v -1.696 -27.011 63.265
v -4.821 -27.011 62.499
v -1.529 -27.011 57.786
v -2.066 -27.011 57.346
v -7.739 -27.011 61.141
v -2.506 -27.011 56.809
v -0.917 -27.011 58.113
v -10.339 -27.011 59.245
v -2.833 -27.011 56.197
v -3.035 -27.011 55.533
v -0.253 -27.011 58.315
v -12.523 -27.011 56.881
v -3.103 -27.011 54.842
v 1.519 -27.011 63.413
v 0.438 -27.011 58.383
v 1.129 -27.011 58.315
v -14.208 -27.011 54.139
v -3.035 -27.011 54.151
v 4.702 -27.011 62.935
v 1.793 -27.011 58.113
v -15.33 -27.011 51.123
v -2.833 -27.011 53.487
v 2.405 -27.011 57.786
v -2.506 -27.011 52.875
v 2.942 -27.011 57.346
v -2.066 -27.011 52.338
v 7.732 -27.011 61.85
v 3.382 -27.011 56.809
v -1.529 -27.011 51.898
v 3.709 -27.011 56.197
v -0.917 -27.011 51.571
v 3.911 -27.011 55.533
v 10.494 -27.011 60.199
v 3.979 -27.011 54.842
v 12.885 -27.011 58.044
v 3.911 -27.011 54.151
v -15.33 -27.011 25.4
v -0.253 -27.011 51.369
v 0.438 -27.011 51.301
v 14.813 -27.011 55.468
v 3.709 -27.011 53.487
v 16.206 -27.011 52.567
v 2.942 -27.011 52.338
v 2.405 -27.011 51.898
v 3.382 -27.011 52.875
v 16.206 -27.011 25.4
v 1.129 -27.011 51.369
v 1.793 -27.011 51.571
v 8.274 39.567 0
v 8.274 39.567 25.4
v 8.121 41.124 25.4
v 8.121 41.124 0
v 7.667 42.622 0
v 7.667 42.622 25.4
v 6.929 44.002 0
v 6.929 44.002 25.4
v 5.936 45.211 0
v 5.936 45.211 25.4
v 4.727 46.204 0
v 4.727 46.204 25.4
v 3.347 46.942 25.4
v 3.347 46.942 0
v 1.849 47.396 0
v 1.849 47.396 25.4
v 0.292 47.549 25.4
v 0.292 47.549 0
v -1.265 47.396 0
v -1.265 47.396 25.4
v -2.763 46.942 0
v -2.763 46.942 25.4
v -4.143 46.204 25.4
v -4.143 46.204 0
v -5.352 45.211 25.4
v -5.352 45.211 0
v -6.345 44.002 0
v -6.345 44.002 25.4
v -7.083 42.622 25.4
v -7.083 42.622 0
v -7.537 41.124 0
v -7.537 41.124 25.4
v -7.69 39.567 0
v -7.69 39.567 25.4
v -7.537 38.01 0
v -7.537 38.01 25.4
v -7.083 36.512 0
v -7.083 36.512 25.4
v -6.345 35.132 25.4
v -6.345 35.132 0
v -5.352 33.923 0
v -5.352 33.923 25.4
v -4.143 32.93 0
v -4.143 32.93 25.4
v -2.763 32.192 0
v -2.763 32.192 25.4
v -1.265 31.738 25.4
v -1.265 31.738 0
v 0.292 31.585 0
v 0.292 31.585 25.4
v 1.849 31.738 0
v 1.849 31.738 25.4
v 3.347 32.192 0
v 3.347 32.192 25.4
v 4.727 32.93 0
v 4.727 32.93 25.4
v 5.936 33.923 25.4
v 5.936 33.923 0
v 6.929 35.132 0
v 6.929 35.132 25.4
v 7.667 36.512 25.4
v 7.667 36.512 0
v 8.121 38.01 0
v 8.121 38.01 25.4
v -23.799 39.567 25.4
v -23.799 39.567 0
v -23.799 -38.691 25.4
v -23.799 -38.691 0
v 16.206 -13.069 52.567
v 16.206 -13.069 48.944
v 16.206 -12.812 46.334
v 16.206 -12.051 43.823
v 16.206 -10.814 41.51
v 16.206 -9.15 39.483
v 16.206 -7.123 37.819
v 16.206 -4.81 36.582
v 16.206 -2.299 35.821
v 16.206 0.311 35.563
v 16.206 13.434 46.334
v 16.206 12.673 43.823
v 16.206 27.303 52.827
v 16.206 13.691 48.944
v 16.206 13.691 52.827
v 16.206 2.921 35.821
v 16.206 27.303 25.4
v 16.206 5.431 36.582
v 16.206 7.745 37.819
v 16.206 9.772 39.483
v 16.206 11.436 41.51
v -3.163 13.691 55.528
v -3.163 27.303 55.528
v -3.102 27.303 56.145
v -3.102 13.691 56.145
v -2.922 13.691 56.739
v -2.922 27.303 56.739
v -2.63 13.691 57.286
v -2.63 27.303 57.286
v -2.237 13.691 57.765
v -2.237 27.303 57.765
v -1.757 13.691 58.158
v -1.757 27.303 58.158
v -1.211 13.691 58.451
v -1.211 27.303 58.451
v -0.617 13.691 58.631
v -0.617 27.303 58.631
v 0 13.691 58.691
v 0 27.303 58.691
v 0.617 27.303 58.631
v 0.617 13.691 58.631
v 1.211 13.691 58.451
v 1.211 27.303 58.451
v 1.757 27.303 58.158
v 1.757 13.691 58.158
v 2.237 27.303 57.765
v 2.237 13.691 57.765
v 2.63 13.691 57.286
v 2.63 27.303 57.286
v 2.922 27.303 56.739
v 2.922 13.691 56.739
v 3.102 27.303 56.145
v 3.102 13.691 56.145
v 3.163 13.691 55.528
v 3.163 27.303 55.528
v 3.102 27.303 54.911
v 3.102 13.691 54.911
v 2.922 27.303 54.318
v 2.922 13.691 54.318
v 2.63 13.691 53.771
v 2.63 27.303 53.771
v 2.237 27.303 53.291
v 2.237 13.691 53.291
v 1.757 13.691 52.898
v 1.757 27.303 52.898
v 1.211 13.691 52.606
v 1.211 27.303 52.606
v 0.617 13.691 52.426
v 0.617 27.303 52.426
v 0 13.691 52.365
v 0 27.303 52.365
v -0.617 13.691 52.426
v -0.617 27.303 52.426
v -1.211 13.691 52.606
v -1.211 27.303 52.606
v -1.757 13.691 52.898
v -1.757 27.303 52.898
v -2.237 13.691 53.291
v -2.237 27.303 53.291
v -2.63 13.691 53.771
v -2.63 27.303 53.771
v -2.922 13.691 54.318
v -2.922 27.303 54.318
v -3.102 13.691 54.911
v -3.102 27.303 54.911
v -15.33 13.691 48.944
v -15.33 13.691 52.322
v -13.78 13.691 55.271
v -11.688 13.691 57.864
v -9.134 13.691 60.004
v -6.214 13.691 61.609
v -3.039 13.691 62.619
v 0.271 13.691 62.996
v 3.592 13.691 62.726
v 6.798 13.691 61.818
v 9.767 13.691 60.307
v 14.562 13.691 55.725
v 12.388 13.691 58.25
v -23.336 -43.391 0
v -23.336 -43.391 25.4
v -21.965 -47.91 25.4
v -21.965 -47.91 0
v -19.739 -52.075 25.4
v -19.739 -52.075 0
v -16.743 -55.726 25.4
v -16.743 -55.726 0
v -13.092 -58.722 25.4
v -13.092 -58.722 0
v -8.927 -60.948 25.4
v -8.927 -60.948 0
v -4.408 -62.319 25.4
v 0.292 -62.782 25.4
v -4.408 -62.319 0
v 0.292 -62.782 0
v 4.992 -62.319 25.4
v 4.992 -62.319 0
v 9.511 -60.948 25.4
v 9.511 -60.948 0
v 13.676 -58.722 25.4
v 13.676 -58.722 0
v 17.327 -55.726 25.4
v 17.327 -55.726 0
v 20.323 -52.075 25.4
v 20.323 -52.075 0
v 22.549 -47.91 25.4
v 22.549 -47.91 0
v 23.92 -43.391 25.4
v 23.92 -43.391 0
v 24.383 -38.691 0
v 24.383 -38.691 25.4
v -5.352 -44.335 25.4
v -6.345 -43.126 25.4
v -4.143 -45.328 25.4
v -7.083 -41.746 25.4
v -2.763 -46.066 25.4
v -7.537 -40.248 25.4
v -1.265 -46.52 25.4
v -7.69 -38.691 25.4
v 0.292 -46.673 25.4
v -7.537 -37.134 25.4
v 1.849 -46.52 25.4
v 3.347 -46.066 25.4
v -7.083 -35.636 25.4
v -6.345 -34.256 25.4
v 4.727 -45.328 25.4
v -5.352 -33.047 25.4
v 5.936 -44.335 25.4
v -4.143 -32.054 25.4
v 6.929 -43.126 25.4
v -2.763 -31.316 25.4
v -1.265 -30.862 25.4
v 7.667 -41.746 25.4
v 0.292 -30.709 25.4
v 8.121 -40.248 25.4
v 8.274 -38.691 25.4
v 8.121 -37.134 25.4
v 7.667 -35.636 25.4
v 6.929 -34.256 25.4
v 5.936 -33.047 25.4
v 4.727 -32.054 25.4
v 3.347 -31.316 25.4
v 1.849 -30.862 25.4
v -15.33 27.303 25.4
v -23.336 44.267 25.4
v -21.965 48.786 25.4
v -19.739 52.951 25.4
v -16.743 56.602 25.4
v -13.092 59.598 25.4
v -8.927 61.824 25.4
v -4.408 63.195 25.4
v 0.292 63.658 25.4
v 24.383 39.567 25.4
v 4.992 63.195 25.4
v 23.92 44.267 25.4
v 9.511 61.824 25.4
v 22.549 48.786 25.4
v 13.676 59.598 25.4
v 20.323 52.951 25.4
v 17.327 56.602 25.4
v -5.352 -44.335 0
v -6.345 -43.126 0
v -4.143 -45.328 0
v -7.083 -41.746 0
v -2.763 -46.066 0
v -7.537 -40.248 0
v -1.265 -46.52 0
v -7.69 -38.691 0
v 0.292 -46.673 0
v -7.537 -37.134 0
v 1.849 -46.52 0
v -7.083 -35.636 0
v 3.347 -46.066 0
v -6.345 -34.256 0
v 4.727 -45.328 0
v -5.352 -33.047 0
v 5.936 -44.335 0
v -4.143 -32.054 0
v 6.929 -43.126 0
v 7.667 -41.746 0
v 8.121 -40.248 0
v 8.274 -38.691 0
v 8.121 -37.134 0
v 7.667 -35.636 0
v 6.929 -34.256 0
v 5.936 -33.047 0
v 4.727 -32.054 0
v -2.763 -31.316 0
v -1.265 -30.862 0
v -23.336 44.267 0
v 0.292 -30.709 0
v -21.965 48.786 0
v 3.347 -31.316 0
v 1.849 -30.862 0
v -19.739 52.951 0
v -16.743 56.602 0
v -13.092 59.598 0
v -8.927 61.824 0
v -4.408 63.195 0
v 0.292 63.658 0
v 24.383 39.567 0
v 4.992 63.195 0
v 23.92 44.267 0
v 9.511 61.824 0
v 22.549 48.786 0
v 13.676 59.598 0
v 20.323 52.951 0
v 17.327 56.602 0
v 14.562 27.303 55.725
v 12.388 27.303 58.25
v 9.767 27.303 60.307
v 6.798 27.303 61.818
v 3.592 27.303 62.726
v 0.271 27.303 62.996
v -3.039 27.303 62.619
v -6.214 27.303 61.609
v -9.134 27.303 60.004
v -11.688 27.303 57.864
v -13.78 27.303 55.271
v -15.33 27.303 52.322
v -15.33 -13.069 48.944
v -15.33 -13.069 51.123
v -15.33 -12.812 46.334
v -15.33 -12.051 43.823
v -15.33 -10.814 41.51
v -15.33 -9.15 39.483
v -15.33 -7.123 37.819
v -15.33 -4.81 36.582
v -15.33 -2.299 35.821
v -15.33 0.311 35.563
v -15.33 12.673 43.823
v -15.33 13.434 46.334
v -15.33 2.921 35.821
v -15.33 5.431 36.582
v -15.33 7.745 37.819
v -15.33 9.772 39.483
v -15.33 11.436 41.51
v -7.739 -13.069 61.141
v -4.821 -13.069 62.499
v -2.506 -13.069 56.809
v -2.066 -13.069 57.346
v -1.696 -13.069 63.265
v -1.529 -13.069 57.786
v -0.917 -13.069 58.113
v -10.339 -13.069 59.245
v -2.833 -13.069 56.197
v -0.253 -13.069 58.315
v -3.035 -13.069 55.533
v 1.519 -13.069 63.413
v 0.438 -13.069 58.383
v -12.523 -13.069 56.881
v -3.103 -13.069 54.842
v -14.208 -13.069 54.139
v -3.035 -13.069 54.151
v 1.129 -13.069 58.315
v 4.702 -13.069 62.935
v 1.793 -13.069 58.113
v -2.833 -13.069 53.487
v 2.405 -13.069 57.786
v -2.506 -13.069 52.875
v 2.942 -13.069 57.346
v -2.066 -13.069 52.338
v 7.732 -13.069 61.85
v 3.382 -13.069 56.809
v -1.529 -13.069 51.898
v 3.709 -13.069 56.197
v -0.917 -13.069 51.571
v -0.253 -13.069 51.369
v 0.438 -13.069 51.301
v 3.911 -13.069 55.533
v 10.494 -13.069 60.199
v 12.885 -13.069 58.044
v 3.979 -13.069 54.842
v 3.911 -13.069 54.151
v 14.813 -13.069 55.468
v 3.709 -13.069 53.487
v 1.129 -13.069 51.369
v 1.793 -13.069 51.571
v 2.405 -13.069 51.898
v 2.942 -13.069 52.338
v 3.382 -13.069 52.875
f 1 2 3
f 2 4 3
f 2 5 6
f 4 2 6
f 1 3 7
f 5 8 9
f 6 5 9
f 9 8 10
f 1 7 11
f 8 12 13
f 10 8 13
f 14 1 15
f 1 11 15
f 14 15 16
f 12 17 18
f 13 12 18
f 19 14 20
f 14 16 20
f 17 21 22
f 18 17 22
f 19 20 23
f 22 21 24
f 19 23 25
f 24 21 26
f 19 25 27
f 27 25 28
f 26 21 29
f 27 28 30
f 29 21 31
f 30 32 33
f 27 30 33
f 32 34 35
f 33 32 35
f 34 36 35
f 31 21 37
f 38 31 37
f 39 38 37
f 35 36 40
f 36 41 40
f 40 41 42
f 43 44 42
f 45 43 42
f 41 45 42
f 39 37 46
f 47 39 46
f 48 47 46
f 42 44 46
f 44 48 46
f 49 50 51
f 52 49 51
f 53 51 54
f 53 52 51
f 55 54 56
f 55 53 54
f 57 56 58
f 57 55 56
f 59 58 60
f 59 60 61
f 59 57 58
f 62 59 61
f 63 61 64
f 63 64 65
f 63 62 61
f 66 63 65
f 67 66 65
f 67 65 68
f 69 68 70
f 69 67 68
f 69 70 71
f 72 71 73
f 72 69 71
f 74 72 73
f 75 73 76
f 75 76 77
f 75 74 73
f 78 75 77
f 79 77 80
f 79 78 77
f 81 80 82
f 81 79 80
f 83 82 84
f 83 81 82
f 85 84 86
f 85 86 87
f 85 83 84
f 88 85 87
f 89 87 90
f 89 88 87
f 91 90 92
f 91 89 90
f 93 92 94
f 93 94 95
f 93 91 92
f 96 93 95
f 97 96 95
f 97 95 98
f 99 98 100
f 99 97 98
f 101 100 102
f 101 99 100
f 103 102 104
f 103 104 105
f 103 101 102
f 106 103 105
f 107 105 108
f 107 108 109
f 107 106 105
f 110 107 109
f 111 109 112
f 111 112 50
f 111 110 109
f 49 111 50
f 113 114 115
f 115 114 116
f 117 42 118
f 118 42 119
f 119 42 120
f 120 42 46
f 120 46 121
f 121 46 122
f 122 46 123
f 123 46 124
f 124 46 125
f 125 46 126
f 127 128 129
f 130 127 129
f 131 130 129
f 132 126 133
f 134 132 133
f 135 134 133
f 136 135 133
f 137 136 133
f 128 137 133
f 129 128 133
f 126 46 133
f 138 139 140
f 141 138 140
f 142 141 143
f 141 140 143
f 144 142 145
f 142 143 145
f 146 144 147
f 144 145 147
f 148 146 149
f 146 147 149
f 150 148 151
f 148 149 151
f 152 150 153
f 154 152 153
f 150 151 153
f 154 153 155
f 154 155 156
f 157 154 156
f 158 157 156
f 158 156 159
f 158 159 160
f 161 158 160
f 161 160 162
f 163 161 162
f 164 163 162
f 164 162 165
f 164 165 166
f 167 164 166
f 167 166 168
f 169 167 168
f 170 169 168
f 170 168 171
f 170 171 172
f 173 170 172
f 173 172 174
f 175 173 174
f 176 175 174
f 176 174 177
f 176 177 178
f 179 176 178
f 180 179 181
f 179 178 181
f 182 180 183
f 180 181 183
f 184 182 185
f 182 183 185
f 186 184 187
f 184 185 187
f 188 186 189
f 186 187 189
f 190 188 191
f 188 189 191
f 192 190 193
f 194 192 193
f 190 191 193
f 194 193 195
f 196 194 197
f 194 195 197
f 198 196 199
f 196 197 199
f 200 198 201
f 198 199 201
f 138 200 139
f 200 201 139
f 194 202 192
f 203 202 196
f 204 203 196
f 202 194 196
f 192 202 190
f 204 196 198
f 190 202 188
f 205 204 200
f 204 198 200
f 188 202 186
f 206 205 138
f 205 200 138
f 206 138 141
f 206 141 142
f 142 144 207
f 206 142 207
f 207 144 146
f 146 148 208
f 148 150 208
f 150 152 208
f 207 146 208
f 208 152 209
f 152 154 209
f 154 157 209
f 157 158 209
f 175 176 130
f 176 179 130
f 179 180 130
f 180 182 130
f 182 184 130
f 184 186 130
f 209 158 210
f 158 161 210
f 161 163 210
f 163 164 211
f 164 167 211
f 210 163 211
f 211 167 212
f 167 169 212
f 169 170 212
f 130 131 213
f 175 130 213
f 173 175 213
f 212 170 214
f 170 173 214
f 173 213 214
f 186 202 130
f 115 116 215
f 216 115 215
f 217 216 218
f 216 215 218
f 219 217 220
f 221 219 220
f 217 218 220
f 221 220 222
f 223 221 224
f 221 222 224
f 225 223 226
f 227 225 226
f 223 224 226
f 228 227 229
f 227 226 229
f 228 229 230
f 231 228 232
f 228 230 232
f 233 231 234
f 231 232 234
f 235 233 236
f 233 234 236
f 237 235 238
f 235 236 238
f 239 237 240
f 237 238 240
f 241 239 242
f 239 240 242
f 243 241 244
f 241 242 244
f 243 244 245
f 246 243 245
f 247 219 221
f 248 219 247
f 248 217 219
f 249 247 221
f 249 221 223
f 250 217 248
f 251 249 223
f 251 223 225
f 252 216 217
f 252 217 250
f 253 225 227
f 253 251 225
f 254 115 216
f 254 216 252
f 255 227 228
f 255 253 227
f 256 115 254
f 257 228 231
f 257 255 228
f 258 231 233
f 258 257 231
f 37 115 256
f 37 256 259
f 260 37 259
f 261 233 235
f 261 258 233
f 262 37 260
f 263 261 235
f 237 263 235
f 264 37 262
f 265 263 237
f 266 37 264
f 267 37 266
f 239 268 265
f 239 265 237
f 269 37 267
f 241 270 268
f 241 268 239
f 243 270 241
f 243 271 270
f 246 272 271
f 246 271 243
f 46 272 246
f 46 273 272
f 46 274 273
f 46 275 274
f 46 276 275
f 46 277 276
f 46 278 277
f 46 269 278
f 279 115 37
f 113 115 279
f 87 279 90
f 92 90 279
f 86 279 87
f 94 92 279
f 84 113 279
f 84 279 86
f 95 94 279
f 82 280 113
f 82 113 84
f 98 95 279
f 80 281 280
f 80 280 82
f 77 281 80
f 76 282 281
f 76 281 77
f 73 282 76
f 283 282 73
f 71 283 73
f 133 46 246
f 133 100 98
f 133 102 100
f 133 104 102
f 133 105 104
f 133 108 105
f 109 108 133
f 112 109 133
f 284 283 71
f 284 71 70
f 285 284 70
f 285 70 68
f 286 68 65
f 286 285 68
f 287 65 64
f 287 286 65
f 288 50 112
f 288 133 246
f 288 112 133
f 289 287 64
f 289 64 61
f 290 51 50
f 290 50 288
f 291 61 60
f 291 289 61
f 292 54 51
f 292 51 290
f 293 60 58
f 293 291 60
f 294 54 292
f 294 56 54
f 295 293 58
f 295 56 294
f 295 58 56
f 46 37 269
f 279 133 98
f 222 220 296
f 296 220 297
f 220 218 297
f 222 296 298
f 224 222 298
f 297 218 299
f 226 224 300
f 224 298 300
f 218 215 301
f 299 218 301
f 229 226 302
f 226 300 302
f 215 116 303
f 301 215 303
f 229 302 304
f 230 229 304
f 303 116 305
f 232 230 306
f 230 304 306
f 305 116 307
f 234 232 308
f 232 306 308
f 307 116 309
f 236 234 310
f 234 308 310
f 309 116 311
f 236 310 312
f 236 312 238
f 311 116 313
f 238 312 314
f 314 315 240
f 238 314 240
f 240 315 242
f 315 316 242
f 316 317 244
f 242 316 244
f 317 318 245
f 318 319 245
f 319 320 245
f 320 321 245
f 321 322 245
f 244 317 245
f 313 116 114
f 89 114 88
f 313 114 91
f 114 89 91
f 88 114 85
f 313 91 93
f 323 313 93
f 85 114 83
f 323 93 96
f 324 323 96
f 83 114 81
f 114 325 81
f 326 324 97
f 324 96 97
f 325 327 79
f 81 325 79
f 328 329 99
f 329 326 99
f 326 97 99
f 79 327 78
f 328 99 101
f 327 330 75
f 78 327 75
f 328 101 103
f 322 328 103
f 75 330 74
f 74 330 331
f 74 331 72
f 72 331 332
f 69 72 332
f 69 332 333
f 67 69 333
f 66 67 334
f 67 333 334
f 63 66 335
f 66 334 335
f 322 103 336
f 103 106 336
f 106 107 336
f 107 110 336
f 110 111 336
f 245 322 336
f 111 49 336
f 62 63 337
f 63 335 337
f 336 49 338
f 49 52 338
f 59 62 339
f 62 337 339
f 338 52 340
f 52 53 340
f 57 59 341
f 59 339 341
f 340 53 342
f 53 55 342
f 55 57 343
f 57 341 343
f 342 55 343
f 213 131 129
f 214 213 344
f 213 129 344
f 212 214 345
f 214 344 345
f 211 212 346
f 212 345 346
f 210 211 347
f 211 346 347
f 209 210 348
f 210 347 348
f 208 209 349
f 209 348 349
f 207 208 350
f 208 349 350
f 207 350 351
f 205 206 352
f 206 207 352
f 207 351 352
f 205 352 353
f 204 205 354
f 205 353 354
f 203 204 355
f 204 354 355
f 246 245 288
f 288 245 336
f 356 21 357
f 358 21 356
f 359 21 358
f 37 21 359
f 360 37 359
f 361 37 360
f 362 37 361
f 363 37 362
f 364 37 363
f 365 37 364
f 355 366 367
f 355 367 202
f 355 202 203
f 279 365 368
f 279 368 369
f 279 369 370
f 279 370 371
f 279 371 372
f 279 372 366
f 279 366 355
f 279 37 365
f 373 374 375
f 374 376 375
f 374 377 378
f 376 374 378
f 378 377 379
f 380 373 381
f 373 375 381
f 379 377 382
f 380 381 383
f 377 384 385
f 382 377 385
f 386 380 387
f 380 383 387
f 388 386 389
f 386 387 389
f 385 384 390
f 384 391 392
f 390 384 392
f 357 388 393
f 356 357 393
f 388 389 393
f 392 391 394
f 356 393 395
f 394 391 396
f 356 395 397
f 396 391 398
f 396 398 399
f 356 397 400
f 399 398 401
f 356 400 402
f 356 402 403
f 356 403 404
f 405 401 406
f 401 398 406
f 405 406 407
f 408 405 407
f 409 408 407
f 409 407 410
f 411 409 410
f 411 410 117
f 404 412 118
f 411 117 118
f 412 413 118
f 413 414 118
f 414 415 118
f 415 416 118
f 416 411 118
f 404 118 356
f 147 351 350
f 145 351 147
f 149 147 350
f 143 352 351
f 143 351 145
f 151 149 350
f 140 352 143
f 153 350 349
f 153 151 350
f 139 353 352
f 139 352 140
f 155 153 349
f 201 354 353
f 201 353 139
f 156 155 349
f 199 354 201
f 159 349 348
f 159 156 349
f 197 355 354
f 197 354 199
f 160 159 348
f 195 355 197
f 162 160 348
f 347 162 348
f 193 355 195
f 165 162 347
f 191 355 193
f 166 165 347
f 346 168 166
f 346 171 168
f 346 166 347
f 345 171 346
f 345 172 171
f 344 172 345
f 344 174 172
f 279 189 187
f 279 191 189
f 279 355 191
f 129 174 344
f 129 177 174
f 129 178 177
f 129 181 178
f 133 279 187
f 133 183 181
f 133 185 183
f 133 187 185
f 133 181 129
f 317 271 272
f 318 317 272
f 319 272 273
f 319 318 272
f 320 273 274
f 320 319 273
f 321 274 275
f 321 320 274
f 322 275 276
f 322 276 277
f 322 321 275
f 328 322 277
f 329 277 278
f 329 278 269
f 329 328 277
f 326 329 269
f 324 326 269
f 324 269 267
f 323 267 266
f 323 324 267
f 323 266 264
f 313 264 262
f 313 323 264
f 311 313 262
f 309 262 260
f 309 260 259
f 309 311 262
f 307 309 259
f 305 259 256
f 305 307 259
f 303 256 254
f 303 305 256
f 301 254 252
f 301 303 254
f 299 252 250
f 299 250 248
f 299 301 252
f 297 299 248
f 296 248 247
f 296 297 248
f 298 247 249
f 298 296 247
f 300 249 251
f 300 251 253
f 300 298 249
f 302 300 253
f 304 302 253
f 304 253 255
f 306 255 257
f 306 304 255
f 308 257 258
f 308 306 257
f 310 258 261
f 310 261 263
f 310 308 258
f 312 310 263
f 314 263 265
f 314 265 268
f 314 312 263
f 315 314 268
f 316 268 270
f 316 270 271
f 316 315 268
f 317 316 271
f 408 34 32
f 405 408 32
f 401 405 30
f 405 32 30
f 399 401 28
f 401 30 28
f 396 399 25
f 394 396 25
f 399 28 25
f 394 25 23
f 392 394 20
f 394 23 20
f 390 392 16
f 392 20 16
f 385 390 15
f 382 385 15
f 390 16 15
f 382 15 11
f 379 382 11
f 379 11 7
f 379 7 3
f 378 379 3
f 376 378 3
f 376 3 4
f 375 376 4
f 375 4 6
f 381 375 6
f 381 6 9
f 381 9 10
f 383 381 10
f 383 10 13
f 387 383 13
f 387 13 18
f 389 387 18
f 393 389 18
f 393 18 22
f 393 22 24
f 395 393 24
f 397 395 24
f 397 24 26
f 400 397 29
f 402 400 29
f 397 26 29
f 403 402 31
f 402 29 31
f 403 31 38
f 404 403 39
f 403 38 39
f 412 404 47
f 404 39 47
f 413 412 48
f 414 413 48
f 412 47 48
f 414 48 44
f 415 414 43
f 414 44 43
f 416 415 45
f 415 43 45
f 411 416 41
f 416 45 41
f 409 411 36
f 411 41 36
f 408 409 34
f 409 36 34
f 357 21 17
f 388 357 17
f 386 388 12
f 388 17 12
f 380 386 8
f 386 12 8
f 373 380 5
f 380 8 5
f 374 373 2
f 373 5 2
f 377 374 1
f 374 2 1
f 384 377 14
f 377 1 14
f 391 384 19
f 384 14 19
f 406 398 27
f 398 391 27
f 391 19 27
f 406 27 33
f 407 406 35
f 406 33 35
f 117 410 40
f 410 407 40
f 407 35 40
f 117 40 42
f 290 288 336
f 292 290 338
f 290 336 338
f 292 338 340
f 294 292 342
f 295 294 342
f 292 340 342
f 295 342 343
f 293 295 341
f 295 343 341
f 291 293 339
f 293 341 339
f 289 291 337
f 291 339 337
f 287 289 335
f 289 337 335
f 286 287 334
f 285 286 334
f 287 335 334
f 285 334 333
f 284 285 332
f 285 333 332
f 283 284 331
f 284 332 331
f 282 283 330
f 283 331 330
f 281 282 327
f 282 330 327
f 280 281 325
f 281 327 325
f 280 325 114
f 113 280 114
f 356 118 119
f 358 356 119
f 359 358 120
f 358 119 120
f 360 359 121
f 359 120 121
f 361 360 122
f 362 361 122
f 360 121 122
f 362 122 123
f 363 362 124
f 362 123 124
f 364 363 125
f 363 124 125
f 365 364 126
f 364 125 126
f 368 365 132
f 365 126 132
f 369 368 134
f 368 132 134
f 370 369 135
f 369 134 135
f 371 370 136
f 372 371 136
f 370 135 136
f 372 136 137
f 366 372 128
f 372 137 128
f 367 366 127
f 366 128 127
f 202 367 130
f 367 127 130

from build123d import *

# Parameters (mm, degrees)
F0_R      = 7.9822757018
F1_DEPTH  = 25.4
F2_W      = 31.536786817
F2_H      = 54.3133597821
F3_DEPTH  = 38.1
F5_DEPTH  = 35.56
F7_DEPTH  = 33.02
F9_DEPTH  = 33.02
F10_R     = 3.1631900108
F11_DEPTH = 33.02
F12_R     = 3.540896841
F13_DEPTH = 33.02


with BuildPart() as f1:
    # F0 (on Top) → F1 (new body)
    with BuildSketch(Plane.XY):
        with BuildLine():
            Line((24.3826080114, -38.690969348), (24.3826080114, 39.5669899881))
            ThreePointArc((24.3826080114, 39.5669899881), (0.2920059487, 63.6575920507), (-23.7985961139, 39.5669899881))
            Line((-23.7985961139, 39.5669899881), (-23.7985961139, -38.690969348))
            ThreePointArc((-23.7985961139, -38.690969348), (0.2920059487, -62.7815714106), (24.3826080114, -38.690969348))
        make_face()
        with Locations((0.2920059487, -38.690969348)):
            Circle(F0_R, mode=Mode.SUBTRACT)
        with Locations((0.2920059487, 39.5669899881)):
            Circle(F0_R, mode=Mode.SUBTRACT)
    extrude(amount=F1_DEPTH)

    # F2 (on face) → F3 (join)
    with BuildSketch(Plane.XY.offset(25.4)):
        with Locations((0.4380107857, 0.1460043713)):
            Rectangle(F2_W, F2_H)
    extrude(amount=F3_DEPTH)

    # F4 (on face) → F5 (cut)
    with BuildSketch(Plane.YZ.offset(16.2064041942)):
        with BuildLine():
            Line((13.6914392933, 48.9439629018), (13.6914392933, 63.5))
            Line((13.6914392933, 63.5), (-13.0694909021, 63.5))
            Line((-13.0694909021, 63.5), (-13.0694909021, 48.9439629018))
            ThreePointArc((-13.0694909021, 48.9439629018), (0.3109741956, 35.5634978041), (13.6914392933, 48.9439629018))
        make_face()
    extrude(amount=-F5_DEPTH, mode=Mode.SUBTRACT)

    # F6 (on face) → F7 (cut)
    with BuildSketch(Plane.XZ.offset(27.0106755197)):
        with BuildLine():
            ThreePointArc((-15.3303826228, 51.122944802), (-0.0918545456, 63.4173583867), (16.2064041942, 52.5669157505))
            Line((16.2064041942, 52.5669157505), (16.2064041942, 63.5))
            Line((16.2064041942, 63.5), (-15.3303826228, 63.5))
            Line((-15.3303826228, 63.5), (-15.3303826228, 51.122944802))
        make_face()
    extrude(amount=-F7_DEPTH, mode=Mode.SUBTRACT)

    # F8 (on face) → F9 (cut)
    with BuildSketch(Plane(origin=(0, 27.3026842624, 0), x_dir=(-1, 0, 0), z_dir=(0, 1, 0))):
        with BuildLine():
            ThreePointArc((-16.2064041942, 52.8267547488), (-0.2710597584, 62.9963273127), (15.3303826228, 52.3215718567))
            Line((15.3303826228, 52.3215718567), (15.3303826228, 63.5))
            Line((15.3303826228, 63.5), (-16.2064041942, 63.5))
            Line((-16.2064041942, 63.5), (-16.2064041942, 52.8267547488))
        make_face()
    extrude(amount=-F9_DEPTH, mode=Mode.SUBTRACT)

    # F10 (on face) → F11 (cut)
    with BuildSketch(Plane(origin=(0, 27.3026842624, 0), x_dir=(-1, 0, 0), z_dir=(0, 1, 0))):
        with Locations((0, 55.5282048881)):
            Circle(F10_R)
    extrude(amount=-F11_DEPTH, mode=Mode.SUBTRACT)

    # F12 (on face) → F13 (cut)
    with BuildSketch(Plane.XZ.offset(27.0106755197)):
        with Locations((0.4380107857, 54.8420138657)):
            Circle(F12_R)
    extrude(amount=-F13_DEPTH, mode=Mode.SUBTRACT)


solid = f1.part
